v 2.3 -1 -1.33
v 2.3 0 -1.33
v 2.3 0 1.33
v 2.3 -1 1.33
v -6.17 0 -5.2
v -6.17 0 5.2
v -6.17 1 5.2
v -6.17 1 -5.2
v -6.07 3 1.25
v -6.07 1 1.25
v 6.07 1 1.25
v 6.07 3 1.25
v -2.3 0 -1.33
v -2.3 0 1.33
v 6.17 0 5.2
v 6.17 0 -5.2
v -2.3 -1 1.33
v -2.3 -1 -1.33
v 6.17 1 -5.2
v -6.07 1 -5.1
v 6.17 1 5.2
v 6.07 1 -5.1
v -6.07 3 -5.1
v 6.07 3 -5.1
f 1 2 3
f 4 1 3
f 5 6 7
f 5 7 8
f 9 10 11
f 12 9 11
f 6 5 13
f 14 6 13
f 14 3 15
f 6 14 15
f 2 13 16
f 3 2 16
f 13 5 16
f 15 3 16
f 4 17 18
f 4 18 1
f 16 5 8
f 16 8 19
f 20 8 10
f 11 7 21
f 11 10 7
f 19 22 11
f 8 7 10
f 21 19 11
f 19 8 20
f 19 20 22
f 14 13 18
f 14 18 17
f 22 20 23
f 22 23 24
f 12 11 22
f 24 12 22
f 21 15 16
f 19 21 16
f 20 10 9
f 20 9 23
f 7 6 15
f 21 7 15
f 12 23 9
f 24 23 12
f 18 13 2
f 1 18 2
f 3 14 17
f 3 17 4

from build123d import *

# Parameters (mm, degrees)
SKETCH1_W           = 12.34
SKETCH1_H           = 10.4
BOSS_EXTRUDE1_DEPTH = 1
SKETCH2_W           = 12.14
SKETCH2_H           = 6.35
BOSS_EXTRUDE2_DEPTH = 2
SKETCH3_W           = 4.6
SKETCH3_H           = 2.66
BOSS_EXTRUDE3_DEPTH = 1


with BuildPart() as part:
    # Sketch1 → Boss-Extrude1 (new body)
    with BuildSketch(Plane(origin=(0, 0, 0), x_dir=(1, 0, 0), z_dir=(0, 1, 0))):
        Rectangle(SKETCH1_W, SKETCH1_H)
    extrude(amount=BOSS_EXTRUDE1_DEPTH)

    # Sketch2 → Boss-Extrude2 (add)
    with BuildSketch(Plane(origin=(0, 1, 0), x_dir=(1, 0, 0), z_dir=(0, 1, 0))):
        with Locations((0, 1.925)):
            Rectangle(SKETCH2_W, SKETCH2_H)
    extrude(amount=BOSS_EXTRUDE2_DEPTH)

    # Sketch3 → Boss-Extrude3 (add)
    with BuildSketch(Plane.XZ):
        Rectangle(SKETCH3_W, SKETCH3_H)
    extrude(amount=BOSS_EXTRUDE3_DEPTH)


solid = part.part
